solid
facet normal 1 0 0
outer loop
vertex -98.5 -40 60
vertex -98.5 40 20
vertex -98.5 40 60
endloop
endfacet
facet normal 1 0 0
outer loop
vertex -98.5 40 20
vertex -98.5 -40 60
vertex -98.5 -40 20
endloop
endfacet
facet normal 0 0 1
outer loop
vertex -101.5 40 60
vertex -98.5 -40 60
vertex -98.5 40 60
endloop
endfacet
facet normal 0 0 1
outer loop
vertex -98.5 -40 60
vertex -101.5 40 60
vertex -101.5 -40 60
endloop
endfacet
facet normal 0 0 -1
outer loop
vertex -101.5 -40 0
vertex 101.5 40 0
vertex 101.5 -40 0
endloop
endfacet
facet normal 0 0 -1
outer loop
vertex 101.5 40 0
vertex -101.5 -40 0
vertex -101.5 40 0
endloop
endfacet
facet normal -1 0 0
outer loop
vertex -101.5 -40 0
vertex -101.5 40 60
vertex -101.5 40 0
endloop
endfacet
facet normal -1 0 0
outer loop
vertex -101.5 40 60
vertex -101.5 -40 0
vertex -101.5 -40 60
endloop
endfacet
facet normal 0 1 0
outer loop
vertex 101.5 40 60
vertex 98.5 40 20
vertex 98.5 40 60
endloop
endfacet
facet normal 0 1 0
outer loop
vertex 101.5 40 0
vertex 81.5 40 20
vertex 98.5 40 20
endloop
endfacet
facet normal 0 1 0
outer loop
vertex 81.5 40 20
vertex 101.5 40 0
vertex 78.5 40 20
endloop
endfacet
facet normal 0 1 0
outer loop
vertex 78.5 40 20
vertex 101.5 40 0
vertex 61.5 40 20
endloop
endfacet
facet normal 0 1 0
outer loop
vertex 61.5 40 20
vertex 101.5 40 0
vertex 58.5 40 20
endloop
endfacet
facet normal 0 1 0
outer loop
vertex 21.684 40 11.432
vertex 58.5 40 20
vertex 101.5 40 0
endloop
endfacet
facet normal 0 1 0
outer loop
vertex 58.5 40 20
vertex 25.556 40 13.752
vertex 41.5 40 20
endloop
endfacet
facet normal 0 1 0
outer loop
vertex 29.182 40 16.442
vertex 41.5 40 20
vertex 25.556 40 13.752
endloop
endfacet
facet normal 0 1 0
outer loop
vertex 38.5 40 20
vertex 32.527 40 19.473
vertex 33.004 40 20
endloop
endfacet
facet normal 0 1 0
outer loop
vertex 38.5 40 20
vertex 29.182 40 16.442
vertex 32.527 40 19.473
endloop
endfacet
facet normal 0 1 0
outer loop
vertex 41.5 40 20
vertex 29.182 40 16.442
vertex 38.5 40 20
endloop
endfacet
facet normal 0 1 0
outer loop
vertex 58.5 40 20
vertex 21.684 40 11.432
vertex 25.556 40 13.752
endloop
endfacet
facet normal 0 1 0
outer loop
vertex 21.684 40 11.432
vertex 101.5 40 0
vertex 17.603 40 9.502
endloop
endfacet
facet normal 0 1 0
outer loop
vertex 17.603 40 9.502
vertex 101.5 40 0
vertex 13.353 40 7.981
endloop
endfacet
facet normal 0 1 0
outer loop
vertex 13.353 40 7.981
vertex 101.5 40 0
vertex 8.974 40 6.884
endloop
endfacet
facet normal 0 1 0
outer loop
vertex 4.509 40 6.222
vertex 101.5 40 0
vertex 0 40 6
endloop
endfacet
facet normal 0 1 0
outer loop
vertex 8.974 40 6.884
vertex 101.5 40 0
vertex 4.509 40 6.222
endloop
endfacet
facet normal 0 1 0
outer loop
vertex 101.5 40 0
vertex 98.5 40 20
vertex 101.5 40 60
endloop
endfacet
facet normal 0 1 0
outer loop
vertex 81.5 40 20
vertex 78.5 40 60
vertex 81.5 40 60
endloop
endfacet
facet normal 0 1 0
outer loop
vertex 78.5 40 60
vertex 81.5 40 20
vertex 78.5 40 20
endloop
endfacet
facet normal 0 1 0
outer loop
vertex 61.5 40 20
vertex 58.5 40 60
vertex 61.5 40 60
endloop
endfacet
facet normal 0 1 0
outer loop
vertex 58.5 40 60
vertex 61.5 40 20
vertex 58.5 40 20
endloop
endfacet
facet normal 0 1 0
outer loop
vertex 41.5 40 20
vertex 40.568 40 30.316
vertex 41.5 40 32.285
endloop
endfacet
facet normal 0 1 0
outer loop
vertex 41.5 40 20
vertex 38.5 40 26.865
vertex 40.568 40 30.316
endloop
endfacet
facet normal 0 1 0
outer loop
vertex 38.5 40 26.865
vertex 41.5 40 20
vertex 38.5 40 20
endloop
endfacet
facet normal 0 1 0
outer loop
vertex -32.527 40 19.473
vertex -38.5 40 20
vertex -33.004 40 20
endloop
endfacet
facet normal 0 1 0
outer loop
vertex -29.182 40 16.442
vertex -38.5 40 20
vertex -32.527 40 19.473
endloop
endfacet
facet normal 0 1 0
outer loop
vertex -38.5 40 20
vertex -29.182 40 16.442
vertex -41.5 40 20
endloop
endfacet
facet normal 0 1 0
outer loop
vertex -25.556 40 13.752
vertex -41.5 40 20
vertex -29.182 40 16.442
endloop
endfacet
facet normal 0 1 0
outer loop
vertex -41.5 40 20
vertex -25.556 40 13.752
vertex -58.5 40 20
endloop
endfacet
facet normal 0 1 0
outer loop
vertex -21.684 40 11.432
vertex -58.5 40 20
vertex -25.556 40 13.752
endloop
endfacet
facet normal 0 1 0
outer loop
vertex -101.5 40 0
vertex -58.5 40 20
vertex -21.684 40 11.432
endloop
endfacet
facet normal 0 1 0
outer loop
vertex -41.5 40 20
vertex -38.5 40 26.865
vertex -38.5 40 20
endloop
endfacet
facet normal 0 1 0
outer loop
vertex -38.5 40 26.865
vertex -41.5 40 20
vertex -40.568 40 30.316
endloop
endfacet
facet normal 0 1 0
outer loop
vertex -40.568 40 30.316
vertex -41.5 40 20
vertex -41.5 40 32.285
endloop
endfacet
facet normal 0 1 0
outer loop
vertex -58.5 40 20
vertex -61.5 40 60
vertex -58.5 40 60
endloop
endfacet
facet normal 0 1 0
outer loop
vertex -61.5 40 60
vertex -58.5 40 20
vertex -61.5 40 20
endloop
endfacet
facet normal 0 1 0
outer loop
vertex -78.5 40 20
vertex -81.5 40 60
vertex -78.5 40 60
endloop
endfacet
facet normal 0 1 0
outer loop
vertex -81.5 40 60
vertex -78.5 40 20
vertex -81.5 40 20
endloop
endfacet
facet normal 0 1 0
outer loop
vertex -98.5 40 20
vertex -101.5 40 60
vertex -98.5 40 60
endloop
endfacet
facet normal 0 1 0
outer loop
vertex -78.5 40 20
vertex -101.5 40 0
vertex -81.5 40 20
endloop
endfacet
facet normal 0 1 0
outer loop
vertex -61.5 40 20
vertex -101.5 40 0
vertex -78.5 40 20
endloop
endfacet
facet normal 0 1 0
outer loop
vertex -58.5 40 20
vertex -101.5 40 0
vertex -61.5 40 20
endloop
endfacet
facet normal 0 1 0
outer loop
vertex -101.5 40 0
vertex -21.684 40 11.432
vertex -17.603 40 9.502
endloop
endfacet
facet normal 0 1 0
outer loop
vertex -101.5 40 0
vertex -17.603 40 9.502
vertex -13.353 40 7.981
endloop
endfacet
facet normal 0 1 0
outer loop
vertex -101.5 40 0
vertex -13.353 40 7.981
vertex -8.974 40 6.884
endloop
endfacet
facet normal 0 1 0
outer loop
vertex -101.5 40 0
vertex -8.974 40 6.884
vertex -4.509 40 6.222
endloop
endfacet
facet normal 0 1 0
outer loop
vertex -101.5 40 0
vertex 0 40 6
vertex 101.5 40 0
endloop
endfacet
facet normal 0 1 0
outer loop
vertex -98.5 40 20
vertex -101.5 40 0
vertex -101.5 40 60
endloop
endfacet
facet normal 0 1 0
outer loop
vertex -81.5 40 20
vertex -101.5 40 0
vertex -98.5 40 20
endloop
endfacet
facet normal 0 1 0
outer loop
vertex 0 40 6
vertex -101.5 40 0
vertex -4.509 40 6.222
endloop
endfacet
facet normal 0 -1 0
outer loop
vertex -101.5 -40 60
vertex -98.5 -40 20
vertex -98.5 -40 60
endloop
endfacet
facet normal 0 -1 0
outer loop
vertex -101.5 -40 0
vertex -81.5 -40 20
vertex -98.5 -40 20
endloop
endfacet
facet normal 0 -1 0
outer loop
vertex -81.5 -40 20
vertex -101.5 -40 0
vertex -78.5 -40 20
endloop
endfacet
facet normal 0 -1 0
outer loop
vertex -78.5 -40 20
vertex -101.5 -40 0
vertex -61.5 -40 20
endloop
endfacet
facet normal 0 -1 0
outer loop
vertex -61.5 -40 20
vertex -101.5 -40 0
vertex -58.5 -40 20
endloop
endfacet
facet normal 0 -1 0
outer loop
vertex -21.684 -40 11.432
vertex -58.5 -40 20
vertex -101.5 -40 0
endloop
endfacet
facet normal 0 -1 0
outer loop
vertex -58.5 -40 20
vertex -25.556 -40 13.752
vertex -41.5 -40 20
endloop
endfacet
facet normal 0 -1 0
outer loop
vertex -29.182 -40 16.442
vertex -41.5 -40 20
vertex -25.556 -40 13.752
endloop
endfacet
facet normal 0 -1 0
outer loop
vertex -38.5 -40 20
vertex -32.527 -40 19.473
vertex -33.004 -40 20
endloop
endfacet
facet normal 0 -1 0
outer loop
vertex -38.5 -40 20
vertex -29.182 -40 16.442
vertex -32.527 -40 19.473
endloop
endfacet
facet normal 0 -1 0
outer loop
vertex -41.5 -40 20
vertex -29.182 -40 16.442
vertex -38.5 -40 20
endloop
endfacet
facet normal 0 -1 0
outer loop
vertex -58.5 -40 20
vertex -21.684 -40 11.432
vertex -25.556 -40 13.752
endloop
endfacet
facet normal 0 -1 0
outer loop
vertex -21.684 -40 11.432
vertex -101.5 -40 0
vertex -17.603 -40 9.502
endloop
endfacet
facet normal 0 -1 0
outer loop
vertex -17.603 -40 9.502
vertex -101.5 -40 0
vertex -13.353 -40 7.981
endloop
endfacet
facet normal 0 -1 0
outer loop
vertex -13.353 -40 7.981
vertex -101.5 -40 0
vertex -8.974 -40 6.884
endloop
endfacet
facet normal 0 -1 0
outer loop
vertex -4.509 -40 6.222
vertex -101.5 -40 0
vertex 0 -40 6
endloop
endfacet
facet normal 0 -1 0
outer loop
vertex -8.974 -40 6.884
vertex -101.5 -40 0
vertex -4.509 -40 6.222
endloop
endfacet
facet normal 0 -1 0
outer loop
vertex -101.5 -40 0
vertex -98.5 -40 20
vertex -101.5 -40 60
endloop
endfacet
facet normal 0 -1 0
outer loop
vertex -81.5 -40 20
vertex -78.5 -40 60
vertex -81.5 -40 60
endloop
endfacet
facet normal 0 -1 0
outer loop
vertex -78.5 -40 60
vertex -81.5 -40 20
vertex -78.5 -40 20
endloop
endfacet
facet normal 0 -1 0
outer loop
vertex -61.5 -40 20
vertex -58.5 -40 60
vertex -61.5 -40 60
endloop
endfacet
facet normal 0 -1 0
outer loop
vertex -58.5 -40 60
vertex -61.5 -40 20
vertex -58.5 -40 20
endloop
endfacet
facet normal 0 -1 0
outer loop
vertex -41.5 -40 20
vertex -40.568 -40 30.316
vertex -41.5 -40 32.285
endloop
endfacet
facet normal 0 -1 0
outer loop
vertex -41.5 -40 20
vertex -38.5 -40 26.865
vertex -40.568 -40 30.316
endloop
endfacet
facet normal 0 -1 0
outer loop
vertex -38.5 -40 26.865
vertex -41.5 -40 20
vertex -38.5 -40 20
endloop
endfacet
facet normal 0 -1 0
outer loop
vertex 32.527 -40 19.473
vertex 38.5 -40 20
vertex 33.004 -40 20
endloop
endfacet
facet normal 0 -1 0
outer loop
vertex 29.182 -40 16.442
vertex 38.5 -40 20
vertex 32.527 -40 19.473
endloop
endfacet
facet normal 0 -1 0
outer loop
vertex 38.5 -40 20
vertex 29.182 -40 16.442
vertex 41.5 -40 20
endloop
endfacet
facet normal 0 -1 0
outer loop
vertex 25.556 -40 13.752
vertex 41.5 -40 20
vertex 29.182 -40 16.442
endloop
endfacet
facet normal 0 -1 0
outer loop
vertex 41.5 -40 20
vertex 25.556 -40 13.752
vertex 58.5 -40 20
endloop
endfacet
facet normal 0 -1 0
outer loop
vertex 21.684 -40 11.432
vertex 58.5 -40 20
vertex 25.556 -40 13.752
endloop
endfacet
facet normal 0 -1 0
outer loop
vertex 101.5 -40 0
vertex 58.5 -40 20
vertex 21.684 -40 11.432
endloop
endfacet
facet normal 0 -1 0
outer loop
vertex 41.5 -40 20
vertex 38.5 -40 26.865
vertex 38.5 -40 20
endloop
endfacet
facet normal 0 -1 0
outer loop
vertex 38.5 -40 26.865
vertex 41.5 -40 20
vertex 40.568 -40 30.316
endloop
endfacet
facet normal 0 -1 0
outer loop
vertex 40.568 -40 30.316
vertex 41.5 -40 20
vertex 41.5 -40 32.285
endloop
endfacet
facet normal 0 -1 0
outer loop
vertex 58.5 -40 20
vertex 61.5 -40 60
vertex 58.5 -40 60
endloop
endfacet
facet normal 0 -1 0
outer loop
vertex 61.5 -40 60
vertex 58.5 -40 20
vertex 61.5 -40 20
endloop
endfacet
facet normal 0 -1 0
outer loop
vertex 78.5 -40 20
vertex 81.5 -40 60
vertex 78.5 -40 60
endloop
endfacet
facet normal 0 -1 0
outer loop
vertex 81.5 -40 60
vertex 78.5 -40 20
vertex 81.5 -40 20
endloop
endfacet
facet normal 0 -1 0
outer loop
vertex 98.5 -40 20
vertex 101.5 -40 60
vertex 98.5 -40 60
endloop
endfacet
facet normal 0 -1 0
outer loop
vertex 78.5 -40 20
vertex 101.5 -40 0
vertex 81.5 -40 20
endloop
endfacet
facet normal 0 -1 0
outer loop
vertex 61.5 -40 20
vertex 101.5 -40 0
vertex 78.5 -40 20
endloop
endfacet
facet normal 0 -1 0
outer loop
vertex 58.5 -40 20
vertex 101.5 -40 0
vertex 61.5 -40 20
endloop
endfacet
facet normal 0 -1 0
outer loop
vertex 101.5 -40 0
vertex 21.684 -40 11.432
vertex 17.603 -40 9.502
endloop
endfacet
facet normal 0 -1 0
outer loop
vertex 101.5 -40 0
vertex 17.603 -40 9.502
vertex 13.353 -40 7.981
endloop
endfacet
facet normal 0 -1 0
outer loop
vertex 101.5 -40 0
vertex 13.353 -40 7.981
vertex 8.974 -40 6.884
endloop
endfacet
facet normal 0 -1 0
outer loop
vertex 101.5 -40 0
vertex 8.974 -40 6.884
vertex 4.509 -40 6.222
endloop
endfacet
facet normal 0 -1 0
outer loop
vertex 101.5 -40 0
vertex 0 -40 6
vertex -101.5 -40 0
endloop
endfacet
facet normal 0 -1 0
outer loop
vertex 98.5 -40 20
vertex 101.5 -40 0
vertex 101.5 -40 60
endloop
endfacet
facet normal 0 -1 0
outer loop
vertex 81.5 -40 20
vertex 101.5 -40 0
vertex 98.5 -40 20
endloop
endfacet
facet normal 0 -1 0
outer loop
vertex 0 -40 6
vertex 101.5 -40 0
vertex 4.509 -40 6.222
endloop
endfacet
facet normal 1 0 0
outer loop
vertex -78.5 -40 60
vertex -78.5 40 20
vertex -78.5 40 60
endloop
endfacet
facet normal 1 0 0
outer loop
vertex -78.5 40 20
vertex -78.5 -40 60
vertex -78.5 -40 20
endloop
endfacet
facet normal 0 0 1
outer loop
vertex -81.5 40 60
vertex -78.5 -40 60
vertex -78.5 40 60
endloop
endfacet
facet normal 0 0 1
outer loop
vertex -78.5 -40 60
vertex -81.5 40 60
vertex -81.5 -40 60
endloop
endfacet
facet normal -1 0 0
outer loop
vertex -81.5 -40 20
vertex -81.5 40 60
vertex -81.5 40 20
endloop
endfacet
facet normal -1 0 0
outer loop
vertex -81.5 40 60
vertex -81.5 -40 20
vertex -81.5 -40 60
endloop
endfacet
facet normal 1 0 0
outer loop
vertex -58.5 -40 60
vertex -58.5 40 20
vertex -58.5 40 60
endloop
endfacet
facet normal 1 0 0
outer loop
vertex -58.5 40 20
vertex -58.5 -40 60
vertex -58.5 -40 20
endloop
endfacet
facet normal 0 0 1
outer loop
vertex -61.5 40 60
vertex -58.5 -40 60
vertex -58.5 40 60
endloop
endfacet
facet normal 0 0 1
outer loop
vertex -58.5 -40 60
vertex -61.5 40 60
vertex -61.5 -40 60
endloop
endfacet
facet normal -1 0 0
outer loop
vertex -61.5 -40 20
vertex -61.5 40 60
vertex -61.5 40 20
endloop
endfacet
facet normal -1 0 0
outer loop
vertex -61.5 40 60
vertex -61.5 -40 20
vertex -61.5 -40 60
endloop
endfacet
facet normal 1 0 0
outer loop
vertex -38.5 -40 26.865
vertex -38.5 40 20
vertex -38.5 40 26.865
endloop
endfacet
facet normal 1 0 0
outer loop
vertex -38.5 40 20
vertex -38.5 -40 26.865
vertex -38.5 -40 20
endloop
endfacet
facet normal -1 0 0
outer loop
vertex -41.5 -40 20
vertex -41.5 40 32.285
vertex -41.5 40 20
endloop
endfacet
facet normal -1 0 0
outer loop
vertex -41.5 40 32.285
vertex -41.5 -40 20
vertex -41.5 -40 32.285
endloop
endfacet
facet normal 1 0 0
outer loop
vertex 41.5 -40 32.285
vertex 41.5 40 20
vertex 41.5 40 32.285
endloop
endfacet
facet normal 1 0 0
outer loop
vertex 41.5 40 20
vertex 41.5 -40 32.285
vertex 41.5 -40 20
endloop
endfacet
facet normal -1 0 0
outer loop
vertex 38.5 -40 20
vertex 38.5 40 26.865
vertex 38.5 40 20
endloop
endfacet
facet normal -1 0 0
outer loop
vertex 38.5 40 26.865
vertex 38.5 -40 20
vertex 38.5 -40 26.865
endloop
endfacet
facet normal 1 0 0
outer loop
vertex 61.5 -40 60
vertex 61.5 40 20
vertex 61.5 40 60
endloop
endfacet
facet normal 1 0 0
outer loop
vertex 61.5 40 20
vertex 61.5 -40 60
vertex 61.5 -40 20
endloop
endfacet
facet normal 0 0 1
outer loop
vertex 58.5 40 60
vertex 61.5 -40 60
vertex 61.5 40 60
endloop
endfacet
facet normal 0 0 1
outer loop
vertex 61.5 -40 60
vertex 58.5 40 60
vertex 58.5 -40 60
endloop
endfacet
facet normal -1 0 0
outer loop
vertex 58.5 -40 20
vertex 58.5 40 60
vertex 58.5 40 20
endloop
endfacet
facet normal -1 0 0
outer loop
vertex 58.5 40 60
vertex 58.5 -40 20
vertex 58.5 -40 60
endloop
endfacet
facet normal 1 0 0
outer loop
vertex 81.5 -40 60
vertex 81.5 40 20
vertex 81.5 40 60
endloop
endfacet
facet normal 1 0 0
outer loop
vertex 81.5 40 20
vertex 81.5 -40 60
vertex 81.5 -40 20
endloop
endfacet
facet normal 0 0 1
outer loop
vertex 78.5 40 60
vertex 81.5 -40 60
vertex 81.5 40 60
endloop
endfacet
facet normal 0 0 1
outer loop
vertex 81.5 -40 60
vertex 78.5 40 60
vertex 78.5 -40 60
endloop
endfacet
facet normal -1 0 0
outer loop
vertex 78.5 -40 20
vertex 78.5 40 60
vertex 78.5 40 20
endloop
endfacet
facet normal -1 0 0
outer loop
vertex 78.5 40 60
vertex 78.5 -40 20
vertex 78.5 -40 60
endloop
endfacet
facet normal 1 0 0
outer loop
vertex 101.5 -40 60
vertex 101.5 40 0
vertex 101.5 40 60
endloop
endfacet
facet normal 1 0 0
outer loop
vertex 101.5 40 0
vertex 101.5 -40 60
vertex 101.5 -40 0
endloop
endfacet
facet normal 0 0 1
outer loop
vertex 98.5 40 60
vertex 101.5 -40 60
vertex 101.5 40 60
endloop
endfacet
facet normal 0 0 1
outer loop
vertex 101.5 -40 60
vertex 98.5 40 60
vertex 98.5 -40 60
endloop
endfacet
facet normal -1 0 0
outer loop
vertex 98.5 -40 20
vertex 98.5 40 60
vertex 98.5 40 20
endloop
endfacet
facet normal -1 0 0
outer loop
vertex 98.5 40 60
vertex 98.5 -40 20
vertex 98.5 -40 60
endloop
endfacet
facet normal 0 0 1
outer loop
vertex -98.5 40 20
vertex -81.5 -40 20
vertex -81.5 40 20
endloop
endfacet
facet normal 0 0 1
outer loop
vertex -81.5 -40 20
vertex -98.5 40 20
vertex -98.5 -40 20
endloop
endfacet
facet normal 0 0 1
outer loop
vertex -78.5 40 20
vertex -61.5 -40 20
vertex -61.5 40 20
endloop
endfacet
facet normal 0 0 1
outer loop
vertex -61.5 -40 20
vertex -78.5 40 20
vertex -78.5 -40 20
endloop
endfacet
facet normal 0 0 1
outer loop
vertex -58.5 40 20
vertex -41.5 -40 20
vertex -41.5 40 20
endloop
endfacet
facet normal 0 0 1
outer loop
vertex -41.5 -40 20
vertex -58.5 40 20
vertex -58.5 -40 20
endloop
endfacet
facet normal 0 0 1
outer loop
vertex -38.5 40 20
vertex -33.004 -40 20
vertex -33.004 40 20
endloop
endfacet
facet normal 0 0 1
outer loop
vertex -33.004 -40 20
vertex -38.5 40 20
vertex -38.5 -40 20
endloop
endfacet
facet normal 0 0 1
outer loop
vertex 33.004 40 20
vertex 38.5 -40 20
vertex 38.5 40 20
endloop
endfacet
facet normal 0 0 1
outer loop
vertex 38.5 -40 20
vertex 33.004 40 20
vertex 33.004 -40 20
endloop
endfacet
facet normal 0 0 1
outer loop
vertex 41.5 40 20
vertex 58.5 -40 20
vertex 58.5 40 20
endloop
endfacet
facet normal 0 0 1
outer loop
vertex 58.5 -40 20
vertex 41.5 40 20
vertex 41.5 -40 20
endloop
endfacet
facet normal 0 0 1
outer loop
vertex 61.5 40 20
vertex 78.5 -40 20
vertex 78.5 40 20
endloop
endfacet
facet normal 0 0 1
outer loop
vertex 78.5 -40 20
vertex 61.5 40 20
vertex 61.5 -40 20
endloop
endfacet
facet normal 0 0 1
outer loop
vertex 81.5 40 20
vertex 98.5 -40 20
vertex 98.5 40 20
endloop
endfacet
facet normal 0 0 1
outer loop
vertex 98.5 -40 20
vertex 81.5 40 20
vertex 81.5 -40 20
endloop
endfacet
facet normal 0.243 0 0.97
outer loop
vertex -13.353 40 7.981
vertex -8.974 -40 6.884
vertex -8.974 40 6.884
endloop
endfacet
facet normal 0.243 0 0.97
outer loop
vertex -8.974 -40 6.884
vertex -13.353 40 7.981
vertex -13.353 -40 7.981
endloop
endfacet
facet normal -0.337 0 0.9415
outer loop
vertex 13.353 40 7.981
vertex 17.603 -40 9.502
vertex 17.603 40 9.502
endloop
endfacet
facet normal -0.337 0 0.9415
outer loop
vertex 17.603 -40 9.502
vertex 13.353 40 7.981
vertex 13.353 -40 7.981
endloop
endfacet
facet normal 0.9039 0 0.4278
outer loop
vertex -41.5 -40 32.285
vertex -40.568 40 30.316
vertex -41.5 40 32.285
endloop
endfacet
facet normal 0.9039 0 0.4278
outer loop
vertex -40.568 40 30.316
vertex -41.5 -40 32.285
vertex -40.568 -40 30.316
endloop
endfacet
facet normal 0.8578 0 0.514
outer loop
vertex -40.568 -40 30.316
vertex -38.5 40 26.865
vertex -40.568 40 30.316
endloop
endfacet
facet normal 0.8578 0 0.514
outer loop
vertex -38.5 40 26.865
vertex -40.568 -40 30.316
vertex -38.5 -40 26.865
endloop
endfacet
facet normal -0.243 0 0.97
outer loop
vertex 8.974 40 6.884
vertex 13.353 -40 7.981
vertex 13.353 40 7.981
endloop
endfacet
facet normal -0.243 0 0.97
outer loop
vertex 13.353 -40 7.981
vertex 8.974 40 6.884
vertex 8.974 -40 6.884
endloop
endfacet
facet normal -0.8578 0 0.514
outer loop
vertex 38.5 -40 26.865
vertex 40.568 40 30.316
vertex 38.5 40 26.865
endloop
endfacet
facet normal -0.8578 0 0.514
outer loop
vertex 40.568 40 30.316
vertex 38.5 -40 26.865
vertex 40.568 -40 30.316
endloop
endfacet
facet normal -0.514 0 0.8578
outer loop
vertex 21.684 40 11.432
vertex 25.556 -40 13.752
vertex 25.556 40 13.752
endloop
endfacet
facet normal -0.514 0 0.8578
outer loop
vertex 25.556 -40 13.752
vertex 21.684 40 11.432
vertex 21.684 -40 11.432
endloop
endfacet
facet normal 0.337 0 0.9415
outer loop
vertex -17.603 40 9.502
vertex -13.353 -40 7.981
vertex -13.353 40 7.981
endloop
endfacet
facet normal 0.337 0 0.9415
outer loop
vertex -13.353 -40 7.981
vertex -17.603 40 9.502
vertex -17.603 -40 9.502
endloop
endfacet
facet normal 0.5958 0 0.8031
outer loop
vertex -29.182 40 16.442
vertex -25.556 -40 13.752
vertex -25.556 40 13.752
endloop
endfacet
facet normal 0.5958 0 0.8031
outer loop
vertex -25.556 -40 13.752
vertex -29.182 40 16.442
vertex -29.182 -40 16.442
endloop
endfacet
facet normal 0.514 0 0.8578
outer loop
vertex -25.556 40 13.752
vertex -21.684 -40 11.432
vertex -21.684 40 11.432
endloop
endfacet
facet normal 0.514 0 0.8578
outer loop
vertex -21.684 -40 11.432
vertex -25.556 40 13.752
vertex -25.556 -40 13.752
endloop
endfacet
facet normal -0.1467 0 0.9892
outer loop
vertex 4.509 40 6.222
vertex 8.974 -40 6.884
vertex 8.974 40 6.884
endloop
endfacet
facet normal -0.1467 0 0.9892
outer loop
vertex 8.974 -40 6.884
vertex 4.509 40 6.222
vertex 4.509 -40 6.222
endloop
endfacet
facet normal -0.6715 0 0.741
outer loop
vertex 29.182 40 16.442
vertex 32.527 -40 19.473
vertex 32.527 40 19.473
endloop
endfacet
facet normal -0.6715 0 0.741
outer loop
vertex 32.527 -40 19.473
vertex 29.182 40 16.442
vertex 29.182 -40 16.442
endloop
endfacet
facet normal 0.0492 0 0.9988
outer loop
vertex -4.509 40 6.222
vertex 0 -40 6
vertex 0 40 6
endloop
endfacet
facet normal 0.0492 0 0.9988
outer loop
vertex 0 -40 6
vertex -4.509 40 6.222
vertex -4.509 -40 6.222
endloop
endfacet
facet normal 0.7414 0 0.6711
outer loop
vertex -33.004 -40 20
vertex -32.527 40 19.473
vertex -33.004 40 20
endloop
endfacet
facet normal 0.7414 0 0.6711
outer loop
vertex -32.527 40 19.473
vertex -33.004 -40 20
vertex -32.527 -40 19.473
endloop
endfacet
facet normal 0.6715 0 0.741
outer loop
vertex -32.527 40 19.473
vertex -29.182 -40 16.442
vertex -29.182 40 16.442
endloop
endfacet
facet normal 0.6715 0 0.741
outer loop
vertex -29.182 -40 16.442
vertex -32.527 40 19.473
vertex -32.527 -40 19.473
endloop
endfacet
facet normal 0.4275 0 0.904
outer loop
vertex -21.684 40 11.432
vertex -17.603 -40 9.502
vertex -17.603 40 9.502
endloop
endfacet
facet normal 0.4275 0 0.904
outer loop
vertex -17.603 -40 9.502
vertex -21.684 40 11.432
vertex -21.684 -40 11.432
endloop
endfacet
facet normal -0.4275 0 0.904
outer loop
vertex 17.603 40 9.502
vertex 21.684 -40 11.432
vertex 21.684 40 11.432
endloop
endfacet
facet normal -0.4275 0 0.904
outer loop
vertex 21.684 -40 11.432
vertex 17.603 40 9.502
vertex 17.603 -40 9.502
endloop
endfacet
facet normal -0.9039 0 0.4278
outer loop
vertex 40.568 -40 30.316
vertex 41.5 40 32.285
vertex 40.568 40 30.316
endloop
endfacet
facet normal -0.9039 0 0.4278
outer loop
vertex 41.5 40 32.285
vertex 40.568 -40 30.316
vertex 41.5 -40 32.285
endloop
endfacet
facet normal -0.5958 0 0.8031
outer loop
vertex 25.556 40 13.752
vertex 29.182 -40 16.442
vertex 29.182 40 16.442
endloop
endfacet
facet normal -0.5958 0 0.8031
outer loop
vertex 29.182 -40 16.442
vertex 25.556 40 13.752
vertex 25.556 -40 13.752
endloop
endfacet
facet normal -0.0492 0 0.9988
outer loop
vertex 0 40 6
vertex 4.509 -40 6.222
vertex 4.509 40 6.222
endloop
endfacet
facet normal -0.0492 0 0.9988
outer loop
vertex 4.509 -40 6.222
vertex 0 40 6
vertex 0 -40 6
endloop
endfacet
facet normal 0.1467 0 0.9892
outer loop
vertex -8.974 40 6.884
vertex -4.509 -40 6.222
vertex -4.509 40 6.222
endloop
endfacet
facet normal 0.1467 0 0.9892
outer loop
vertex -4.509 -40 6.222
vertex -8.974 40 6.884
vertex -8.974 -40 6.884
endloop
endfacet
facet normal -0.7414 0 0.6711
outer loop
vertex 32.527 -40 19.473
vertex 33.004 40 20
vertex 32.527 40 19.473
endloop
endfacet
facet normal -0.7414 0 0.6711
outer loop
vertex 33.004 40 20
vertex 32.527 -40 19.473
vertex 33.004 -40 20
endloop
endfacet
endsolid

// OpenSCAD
// Dimensions (mm) - measured with calipers
base_length = 203;
base_width = 80;
base_height = 20;

cradle_radius = 46;
cradle_axis_y = 0;
cradle_axis_z = 52;

divider_thickness = 3;
divider_height = 60;
num_dividers = 11;
slot_width = 17; // 20 mm spacing - 3 mm divider = 17 mm slot

// Quality
$fn = 64;

// Center the base on the origin in X and Y
base_x = -base_length / 2;
base_y = -base_width / 2;

// Build the part: Base + Dividers minus Cradle
difference() {
    union() {
        // Base block
        translate([base_x, base_y, 0])
            cube([base_length, base_width, base_height]);

        // Divider plates
        // Dividers at x = -100, -80, ..., 100
        // These are 20 mm apart, centered on the base
        // The base is 203 mm long, from -101.5 to 101.5
        // Dividers are 3 mm thick, so they occupy x ranges like [-101.5, -98.5], etc.
        for (i = [0 : num_dividers - 1]) {
            x_pos = -100 + i * 20;
            translate([x_pos - divider_thickness/2, base_y, 0])
                cube([divider_thickness, base_width, divider_height]);
        }
    }
    
    // Cradle cut: cylinder along X axis
    // Center at y=0, z=52, radius=46
    // Extend past the base in X direction by 1 mm to ensure clean cut
    translate([0, cradle_axis_y, cradle_axis_z])
        rotate([90, 0, 0]) // Rotate so cylinder axis is along X
        cylinder(r = cradle_radius, h = base_length + 2, center = true);
}
